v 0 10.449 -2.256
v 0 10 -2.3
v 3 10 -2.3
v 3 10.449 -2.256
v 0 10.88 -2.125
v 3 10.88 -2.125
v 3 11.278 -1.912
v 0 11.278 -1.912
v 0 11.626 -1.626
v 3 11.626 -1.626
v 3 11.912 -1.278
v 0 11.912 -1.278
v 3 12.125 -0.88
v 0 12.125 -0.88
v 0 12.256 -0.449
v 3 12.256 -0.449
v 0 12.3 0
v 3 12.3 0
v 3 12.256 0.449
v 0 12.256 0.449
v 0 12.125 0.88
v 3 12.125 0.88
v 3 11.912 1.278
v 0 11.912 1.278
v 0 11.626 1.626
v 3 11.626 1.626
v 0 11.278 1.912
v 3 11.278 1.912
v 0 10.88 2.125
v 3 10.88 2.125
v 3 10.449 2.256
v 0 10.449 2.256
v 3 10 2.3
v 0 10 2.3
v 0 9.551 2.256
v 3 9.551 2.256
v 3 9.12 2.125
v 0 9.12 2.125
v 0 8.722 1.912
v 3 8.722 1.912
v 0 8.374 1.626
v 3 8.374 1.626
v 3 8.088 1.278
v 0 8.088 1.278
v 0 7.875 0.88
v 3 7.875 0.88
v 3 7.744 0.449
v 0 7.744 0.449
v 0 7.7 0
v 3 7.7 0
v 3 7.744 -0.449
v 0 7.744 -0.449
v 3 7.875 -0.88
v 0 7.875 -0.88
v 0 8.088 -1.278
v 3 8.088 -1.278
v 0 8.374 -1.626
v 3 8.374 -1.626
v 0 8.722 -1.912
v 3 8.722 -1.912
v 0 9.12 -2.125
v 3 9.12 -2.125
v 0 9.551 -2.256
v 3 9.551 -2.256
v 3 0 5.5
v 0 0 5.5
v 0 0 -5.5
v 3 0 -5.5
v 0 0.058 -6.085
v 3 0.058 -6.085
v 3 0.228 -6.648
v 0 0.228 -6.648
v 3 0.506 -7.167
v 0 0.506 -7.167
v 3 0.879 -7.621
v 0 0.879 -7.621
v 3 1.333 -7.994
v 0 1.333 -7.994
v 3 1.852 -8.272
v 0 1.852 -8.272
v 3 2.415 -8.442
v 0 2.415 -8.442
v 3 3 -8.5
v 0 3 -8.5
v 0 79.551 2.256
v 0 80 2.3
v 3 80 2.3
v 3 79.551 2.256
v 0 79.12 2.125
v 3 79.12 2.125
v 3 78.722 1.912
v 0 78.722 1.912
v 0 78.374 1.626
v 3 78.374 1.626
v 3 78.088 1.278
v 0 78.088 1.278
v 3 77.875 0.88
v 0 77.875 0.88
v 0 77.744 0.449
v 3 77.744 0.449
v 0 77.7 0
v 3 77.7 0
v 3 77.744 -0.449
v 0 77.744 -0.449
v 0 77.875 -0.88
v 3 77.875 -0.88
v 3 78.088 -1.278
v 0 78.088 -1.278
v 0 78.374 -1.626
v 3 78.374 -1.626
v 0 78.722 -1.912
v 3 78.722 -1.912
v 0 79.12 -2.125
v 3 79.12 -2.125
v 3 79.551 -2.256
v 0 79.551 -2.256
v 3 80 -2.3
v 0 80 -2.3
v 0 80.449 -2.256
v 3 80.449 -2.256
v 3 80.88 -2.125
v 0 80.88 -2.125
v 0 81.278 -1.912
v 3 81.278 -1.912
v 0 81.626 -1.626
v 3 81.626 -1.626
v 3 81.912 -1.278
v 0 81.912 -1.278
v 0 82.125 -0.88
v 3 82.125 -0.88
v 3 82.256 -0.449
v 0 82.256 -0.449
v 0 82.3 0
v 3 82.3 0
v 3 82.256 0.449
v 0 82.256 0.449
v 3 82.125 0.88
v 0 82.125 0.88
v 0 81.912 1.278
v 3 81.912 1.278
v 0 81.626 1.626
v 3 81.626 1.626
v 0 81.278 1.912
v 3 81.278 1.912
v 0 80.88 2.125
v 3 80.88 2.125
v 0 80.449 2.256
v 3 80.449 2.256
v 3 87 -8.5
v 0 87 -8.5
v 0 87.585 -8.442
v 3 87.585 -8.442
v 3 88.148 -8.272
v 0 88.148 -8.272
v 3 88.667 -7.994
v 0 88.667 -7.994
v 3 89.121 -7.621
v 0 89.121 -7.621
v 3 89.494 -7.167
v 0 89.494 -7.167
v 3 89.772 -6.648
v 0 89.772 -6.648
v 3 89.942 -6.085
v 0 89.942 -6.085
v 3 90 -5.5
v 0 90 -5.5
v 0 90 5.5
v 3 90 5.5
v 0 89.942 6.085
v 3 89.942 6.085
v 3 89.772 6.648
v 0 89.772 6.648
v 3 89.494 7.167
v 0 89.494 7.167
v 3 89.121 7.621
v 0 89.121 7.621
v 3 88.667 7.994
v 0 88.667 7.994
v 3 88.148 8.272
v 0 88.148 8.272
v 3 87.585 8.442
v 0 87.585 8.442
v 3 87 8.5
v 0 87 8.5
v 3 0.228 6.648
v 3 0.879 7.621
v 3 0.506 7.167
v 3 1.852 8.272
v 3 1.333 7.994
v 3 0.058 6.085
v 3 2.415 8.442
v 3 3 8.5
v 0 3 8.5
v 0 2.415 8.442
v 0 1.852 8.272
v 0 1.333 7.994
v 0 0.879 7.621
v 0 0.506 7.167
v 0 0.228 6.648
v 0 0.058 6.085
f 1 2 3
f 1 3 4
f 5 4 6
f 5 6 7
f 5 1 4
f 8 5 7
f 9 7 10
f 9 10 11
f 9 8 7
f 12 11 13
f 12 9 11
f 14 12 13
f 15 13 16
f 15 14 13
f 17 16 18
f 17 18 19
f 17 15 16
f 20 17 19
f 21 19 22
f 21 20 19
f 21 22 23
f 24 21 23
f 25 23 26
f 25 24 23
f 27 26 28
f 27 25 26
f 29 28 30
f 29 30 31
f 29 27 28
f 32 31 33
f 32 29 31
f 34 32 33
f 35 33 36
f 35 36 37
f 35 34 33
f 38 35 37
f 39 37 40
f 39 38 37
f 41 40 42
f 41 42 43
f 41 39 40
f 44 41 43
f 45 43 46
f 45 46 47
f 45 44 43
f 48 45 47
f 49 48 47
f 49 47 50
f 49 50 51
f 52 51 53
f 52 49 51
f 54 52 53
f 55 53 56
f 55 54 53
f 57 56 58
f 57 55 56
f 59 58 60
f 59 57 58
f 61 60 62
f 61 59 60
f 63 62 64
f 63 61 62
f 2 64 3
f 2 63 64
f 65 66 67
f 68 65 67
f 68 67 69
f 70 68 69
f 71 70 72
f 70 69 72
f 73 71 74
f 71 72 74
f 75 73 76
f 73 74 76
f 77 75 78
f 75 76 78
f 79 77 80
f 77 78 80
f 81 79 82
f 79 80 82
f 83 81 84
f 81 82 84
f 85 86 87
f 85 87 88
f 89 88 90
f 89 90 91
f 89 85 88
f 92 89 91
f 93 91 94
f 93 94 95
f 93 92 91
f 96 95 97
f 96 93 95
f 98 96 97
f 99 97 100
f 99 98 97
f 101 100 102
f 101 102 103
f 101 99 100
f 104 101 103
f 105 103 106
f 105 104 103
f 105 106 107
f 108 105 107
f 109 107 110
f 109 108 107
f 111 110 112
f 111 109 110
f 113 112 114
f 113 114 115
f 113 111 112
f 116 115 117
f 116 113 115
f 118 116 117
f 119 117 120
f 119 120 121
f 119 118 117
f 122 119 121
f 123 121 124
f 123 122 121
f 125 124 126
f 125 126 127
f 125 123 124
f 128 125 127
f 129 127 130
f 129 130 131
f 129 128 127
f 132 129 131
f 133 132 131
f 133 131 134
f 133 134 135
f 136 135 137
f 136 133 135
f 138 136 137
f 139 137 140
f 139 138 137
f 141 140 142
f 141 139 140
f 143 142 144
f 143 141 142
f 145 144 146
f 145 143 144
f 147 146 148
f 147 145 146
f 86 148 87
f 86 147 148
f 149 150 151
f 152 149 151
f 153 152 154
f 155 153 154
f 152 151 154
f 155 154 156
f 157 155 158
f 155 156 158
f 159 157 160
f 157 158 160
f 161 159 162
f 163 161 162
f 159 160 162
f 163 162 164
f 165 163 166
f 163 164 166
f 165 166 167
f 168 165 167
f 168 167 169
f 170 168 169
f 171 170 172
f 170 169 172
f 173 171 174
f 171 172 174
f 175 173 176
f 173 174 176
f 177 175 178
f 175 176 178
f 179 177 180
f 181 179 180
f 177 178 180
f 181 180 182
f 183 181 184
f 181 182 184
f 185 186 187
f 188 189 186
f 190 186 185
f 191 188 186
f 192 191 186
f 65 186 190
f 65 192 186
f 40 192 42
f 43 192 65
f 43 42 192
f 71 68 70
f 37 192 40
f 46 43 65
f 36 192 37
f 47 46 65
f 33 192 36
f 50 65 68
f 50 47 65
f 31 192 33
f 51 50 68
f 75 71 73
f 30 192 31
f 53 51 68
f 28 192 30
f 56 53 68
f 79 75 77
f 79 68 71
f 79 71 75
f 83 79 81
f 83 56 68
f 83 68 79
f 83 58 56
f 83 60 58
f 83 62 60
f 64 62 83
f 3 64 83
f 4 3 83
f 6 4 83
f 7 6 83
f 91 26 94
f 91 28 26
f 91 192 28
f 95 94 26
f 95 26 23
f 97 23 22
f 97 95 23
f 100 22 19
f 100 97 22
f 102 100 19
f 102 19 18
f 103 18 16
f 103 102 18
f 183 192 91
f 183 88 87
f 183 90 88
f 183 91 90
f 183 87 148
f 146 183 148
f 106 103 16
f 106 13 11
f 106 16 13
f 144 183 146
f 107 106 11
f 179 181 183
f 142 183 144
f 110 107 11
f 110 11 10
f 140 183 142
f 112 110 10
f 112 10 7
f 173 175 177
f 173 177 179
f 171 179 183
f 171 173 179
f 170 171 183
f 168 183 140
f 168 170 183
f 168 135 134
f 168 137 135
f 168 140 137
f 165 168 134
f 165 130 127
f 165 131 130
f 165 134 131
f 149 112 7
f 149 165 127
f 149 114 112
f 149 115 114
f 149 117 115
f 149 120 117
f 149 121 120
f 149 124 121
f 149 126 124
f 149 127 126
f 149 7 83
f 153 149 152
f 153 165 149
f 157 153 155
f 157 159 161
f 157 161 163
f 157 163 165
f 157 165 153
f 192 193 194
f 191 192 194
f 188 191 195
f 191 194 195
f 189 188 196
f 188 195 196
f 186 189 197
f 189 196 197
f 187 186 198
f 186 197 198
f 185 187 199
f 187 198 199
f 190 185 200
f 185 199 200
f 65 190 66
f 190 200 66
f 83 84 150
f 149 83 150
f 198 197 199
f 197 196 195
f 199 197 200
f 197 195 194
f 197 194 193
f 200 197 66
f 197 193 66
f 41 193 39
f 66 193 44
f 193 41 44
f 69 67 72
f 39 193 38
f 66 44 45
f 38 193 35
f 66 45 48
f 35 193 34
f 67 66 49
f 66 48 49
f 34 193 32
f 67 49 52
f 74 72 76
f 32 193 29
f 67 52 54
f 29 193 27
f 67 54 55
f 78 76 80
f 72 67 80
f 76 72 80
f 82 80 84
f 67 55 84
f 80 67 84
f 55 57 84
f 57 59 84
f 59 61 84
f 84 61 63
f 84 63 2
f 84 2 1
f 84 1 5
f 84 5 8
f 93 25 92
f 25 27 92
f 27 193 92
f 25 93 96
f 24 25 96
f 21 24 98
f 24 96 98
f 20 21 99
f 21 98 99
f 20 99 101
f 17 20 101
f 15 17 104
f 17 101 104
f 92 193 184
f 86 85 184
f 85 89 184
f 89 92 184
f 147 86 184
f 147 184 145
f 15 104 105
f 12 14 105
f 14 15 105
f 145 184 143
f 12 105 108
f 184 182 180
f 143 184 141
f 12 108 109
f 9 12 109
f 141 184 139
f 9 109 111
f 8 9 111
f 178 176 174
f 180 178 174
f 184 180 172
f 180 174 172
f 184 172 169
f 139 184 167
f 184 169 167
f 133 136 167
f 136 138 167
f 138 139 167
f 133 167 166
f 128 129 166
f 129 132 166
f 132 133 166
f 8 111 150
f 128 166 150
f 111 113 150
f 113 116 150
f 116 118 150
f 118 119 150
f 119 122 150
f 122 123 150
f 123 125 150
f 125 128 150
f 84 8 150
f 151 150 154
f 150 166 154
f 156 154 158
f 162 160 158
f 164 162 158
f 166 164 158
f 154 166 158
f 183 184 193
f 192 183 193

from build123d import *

# Parameters (mm, degrees)
SKETCH1_R           = 2.3
BOSS_EXTRUDE1_DEPTH = 3


with BuildPart() as part:
    # Sketch1 → Boss-Extrude1 (new body)
    with BuildSketch(Plane(origin=(0, 0, 0), x_dir=(0, 0, -1), z_dir=(1, 0, 0))):
        with BuildLine():
            Line((-5.5, 0), (5.5, 0))
            ThreePointArc((5.5, 0), (7.621320344, 0.878679656), (8.5, 3))
            Line((8.5, 3), (8.5, 87))
            ThreePointArc((8.5, 87), (7.621320344, 89.121320344), (5.5, 90))
            Line((5.5, 90), (-5.5, 90))
            ThreePointArc((-5.5, 90), (-7.621320344, 89.121320344), (-8.5, 87))
            Line((-8.5, 87), (-8.5, 3))
            ThreePointArc((-8.5, 3), (-7.621320344, 0.878679656), (-5.5, 0))
        make_face()
        with Locations((0, 10)):
            Circle(SKETCH1_R, mode=Mode.SUBTRACT)
        with Locations(Location((0, 80, 0), (0, 0, 180))):
            Circle(SKETCH1_R, mode=Mode.SUBTRACT)
    extrude(amount=BOSS_EXTRUDE1_DEPTH)


solid = part.part
